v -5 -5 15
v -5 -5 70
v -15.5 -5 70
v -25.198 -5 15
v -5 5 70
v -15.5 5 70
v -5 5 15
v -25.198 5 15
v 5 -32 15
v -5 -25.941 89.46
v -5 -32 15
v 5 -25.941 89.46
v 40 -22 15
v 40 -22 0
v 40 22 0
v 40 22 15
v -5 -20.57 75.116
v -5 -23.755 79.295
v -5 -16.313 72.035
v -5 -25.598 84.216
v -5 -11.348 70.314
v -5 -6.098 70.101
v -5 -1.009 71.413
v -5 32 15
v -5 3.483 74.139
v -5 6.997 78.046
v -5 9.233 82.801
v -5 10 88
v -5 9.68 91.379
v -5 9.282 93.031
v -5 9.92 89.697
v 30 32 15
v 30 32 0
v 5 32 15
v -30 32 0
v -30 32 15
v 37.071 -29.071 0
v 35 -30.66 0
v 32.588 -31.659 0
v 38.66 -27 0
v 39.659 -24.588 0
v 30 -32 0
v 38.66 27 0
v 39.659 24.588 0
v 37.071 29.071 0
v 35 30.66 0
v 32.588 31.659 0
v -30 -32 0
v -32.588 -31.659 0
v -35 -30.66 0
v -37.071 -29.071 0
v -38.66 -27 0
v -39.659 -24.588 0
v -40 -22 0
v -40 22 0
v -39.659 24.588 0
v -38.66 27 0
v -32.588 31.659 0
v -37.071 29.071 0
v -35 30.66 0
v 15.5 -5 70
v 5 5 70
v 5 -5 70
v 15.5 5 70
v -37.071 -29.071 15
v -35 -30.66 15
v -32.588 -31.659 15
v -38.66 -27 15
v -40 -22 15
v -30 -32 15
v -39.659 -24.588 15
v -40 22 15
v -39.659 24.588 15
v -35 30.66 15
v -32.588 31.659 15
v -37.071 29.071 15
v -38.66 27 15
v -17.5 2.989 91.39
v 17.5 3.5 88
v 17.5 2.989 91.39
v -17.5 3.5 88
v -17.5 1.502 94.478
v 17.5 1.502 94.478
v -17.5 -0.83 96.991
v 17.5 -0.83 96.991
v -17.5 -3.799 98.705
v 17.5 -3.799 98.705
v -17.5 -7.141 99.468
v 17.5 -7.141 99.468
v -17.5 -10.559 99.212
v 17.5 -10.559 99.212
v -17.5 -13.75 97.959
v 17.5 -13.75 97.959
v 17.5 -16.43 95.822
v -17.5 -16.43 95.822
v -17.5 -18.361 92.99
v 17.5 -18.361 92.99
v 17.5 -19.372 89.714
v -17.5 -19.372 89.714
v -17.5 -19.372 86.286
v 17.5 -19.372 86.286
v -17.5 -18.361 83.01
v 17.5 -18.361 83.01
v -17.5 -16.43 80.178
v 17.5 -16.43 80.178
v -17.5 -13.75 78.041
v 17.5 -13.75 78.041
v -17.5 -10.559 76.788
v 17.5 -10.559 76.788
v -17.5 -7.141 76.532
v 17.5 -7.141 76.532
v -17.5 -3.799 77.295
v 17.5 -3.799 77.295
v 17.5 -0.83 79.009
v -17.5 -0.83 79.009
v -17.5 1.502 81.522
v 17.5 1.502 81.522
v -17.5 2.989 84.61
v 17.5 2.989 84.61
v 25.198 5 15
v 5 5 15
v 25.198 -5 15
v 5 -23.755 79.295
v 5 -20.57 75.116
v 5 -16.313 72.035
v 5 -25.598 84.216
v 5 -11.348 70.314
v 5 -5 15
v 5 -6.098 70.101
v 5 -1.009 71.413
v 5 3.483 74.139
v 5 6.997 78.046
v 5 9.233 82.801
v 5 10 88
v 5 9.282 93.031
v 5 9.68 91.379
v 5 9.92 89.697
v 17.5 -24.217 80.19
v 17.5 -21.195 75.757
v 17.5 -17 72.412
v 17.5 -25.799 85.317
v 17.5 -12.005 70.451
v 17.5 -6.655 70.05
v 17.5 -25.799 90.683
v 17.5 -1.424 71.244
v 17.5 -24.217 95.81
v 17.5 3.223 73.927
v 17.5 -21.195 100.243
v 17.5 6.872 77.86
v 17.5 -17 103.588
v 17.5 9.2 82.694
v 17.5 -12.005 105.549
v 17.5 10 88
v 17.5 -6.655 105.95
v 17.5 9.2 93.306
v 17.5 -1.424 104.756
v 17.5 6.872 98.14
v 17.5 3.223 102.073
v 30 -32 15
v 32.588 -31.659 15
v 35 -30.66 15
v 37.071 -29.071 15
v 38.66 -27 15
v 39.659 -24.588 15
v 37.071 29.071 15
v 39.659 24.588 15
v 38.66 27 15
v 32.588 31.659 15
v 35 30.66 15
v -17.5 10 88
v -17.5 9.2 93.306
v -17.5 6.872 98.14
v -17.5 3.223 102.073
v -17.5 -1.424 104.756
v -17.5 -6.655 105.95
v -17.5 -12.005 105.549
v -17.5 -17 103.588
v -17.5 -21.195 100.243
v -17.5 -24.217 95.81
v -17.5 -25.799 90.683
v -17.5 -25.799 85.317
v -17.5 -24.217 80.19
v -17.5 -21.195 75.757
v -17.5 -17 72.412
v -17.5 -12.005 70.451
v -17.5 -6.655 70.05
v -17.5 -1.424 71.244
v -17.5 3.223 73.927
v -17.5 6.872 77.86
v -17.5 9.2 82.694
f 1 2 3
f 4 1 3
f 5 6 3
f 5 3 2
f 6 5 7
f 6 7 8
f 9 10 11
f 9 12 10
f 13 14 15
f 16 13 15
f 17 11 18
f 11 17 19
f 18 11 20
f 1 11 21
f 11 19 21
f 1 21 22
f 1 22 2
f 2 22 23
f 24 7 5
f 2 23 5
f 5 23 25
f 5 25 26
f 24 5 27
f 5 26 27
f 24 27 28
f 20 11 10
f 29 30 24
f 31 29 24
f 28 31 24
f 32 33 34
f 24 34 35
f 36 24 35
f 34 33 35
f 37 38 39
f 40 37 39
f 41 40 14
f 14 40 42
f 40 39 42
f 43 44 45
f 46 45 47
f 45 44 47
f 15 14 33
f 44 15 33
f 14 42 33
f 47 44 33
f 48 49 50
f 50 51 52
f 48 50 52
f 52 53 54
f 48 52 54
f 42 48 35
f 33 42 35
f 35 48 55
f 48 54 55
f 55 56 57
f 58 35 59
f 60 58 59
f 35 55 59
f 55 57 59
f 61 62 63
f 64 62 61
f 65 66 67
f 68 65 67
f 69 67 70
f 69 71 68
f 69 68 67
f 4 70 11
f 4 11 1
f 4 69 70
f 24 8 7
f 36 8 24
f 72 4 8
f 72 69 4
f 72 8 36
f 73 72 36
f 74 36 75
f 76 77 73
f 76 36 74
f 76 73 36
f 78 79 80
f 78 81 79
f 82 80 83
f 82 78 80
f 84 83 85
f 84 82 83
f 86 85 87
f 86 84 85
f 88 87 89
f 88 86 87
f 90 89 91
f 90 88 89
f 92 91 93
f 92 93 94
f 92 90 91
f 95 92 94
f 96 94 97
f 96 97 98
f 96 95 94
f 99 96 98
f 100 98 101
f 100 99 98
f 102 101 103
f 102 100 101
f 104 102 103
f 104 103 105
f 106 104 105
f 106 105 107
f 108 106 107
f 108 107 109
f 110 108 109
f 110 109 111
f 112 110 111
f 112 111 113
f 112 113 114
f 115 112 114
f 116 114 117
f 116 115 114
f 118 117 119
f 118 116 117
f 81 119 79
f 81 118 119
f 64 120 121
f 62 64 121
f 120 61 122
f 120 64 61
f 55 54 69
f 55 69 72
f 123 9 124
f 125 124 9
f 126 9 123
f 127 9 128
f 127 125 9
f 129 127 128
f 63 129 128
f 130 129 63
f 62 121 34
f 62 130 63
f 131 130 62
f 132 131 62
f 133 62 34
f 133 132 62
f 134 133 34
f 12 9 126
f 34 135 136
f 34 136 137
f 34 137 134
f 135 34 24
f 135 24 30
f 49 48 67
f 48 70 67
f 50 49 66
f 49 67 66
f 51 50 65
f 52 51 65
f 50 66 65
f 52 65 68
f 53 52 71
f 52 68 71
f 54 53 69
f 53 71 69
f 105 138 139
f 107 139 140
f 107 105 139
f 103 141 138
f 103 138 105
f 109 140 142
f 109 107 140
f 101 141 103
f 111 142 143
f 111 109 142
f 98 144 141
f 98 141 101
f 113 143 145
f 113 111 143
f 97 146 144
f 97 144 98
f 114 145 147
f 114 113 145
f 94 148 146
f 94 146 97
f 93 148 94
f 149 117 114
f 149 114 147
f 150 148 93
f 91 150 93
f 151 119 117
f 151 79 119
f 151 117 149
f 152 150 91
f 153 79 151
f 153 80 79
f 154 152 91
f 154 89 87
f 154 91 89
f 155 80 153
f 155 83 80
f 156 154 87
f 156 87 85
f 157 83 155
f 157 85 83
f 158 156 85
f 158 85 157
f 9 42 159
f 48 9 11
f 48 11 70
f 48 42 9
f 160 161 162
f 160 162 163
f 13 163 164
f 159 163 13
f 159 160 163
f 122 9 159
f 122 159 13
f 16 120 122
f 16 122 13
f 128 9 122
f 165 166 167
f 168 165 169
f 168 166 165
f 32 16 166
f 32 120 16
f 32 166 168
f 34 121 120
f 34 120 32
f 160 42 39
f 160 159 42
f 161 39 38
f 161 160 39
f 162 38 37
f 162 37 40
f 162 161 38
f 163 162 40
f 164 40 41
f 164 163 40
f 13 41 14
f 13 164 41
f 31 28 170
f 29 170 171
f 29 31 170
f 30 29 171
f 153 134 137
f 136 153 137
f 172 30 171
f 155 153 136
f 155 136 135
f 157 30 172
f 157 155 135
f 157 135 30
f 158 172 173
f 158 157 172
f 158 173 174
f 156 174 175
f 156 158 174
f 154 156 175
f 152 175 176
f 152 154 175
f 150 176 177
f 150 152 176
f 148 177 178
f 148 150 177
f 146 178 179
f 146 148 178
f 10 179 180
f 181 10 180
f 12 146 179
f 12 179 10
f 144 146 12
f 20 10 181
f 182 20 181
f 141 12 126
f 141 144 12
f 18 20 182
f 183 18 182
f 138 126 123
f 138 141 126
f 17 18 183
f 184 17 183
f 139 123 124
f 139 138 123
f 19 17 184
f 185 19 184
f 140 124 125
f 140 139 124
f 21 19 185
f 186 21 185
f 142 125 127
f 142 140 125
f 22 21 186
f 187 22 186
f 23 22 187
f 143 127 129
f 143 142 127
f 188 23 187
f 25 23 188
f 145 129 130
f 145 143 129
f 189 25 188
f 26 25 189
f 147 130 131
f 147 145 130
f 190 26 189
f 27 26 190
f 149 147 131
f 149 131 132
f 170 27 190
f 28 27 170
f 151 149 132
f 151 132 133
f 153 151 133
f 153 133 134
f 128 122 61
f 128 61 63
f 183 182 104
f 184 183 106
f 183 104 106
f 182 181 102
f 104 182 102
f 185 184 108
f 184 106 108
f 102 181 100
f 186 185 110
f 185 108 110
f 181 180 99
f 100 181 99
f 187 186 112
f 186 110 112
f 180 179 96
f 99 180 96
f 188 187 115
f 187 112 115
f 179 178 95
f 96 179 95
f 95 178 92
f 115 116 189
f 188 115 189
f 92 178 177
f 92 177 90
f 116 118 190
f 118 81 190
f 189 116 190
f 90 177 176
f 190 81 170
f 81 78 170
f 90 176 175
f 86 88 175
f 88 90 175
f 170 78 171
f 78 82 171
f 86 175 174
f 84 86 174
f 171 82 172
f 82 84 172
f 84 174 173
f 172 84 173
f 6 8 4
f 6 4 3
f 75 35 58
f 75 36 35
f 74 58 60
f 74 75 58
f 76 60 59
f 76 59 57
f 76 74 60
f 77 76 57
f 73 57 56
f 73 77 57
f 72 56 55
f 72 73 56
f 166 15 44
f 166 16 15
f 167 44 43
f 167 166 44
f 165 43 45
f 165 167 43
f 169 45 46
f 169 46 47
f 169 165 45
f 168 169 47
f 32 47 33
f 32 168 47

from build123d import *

# Parameters (mm, degrees)
SKETCH1_W           = 64
SKETCH1_H           = 80
BOSS_EXTRUDE1_DEPTH = 15
FILLET2_R           = 10
SKETCH2_R           = 18
SKETCH2_R_2         = 11.5
EXTRUDE_THIN1_DEPTH = 17.5
BOSS_EXTRUDE2_DEPTH = 5
BOSS_EXTRUDE3_DEPTH = 5


with BuildPart() as part:
    # Sketch1 → Boss-Extrude1 (new body)
    with BuildSketch(Plane(origin=(0, 0, 0), x_dir=(0, 1, 0), z_dir=(0, 0, 1))):
        Rectangle(SKETCH1_W, SKETCH1_H)
    extrude(amount=BOSS_EXTRUDE1_DEPTH)

    # Fillet2
    fillet2_edges = [part.edges().sort_by_distance(p)[0] for p in [
        (40, 32, 7.5),
        (40, -32, 7.5),
        (-40, -32, 7.5),
        (-40, 32, 7.5),
    ]]
    fillet(fillet2_edges, radius=FILLET2_R)



with BuildPart() as body_2:
    # Sketch2 → Extrude-Thin1 (new, symmetric)
    with BuildSketch(Plane.YZ):
        with Locations((-8, 88)):
            Circle(SKETCH2_R)
        with Locations((-8, 88)):
            Circle(SKETCH2_R_2, mode=Mode.SUBTRACT)
    extrude(amount=EXTRUDE_THIN1_DEPTH, both=True)


with BuildPart() as part_1:
    add(part.part)

    add(body_2.part)  # Boss-Extrude2 merges body 2
    # Sketch3 → Boss-Extrude2 (add, symmetric)
    with BuildSketch(Plane.YZ):
        with BuildLine():
            Line((-25.940694884, 89.459954482), (-32, 15))
            Line((-32, 15), (32, 15))
            Line((32, 15), (9.282478357, 93.03149499))
            ThreePointArc((9.282478357, 93.03149499), (9.819716755, 90.541199478), (10, 88))
            ThreePointArc((10, 88), (-8.730579254, 70.01483239), (-25.940694884, 89.459954482))
        make_face()
    extrude(amount=BOSS_EXTRUDE2_DEPTH, both=True)

    # Sketch4 → Boss-Extrude3 (add, symmetric)
    with BuildSketch(Plane(origin=(0, 0, 0), x_dir=(-1, 0, 0), z_dir=(0, 1, 0))):
        Polygon((-15.5, 70), (-25.197983939, 15), (25.197983939, 15), (15.5, 70), align=None)
    extrude(amount=BOSS_EXTRUDE3_DEPTH, both=True)


solid = part_1.part
